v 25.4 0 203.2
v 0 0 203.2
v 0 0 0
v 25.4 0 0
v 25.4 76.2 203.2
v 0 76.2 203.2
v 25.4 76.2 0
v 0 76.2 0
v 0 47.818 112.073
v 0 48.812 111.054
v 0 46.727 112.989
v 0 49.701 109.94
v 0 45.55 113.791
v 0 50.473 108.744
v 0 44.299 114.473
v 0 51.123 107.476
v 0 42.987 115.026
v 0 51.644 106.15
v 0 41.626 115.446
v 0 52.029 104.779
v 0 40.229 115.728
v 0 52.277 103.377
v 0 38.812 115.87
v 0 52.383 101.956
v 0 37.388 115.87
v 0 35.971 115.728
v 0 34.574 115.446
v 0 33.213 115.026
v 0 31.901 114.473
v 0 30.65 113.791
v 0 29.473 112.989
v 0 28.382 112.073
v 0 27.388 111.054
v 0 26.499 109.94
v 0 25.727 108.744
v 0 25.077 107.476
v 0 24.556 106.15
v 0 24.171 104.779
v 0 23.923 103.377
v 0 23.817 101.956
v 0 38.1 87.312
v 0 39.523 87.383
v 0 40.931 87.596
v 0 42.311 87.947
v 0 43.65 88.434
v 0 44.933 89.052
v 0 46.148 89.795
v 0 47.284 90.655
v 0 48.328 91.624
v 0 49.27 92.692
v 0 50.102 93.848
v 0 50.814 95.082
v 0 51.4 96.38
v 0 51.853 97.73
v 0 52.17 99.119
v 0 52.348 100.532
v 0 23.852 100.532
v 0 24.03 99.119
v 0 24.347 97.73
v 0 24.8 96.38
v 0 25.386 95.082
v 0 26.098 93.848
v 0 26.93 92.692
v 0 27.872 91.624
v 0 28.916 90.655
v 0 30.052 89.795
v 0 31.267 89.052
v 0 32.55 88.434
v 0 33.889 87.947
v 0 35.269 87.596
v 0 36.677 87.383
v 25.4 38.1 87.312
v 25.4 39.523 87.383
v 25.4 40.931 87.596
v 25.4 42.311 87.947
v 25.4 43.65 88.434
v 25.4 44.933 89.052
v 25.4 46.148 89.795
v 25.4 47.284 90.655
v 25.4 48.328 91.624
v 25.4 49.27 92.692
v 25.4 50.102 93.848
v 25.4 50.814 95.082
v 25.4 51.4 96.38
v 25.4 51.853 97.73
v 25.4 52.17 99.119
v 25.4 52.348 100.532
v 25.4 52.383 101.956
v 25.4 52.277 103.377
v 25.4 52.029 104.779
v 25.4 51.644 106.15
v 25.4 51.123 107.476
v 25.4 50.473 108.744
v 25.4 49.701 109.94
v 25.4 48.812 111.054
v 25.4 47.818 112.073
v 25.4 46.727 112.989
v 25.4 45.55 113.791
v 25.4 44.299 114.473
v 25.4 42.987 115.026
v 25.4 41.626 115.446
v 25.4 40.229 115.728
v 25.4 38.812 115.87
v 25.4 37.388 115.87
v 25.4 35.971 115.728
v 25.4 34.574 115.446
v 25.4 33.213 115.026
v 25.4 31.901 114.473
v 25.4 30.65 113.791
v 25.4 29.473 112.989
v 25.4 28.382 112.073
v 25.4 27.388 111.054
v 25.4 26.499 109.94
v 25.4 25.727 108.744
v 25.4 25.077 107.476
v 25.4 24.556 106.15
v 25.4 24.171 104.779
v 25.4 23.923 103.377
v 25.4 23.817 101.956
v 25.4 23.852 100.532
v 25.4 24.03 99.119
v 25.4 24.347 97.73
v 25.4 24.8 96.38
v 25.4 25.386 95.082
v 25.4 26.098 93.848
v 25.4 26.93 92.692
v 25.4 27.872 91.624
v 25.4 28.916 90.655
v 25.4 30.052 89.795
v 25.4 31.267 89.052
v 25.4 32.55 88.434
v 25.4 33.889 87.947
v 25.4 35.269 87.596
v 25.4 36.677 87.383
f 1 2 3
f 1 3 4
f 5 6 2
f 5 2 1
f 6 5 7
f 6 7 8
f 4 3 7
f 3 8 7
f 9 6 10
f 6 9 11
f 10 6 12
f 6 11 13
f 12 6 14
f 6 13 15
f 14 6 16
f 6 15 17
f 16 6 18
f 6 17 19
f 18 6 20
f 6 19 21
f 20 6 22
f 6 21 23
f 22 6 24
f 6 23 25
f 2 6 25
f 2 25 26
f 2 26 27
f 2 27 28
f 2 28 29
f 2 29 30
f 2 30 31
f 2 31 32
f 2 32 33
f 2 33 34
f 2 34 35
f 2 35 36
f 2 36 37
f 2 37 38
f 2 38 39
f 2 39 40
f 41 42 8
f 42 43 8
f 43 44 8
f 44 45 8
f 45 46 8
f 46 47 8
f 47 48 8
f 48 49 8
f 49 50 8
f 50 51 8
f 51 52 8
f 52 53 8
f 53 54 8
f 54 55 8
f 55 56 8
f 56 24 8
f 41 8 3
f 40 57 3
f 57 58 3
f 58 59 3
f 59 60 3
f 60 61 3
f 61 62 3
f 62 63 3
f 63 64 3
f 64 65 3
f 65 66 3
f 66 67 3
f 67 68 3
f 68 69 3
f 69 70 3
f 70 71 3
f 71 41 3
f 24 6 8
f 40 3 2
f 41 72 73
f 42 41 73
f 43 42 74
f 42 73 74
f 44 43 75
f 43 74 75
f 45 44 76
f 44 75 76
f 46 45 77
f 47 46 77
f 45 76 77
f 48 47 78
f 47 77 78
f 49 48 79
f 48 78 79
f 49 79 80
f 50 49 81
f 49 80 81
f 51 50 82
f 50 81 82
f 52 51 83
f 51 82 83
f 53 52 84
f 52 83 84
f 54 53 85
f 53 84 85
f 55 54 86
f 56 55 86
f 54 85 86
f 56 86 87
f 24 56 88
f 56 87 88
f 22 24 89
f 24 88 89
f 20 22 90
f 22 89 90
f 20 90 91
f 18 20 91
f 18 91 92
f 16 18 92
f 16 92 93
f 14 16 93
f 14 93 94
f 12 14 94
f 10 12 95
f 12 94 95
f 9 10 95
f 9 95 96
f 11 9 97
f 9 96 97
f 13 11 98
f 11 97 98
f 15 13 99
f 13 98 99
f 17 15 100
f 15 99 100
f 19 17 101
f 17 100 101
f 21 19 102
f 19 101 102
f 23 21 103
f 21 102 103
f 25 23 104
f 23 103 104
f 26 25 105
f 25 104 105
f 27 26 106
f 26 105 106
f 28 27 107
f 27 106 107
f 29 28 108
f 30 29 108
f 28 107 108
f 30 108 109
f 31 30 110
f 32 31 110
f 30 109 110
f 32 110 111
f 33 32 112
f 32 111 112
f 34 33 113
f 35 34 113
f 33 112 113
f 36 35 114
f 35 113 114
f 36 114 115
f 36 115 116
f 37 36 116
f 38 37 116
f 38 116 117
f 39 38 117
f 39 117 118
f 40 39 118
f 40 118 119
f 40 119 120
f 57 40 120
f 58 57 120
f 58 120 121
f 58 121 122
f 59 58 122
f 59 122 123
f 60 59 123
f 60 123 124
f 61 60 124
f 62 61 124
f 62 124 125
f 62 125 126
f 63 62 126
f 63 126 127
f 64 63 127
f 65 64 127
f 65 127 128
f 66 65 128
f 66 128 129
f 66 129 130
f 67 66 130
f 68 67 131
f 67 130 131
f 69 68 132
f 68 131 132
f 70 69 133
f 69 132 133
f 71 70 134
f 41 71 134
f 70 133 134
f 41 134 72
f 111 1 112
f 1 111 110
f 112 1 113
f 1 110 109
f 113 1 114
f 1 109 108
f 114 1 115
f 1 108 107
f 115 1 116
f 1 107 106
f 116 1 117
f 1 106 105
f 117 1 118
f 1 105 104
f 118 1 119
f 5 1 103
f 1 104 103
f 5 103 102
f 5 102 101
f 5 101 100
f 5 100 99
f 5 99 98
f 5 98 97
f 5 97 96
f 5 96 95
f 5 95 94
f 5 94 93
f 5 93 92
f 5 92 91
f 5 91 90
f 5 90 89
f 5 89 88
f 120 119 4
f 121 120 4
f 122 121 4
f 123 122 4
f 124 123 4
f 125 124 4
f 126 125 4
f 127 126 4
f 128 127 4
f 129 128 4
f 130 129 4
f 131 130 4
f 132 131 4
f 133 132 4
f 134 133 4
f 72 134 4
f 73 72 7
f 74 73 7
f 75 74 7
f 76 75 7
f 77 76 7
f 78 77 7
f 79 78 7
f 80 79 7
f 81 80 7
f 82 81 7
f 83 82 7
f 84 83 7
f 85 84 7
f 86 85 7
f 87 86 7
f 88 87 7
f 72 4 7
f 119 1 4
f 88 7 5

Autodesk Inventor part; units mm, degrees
ref_plane "YZ Plane" through (0, 0, 0) normal (1, 0, 0) x (0, 1, 0)
ref_plane "XZ Plane" through (0, 0, 0) normal (0, 1, 0) x (-1, 0, 0)
ref_plane "XY Plane" through (0, 0, 0) normal (0, 0, 1) x (1, 0, 0)
sketch "Sketch1" plane through (0, 0, 0) normal (0, 0, 1) x (1, 0, 0)
  line L0 (0, 0) -> (25.4, 0)
  line L1 (25.4, 0) -> (25.4, 76.2)
  line L2 (25.4, 76.2) -> (0, 76.2)
  line L3 (0, 76.2) -> (0, 0)
  dimension "d0" = 25.4
  dimension "d1" = 76.2
extrude "Extrusion1" add sketch "Sketch1" along normal blind 203.2
sketch "Sketch2" plane through (25.4, 0, 0) normal (1, 0, 0) x (0, 0, -1)
  circle A0 centre (-101.6, 38.1) radius 14.2875
  point P0 (0, 0)
  dimension "d4" = 28.575
extrude "Extrusion2" cut sketch "Sketch2" against normal up to next
properties part number "mountingBoard"
